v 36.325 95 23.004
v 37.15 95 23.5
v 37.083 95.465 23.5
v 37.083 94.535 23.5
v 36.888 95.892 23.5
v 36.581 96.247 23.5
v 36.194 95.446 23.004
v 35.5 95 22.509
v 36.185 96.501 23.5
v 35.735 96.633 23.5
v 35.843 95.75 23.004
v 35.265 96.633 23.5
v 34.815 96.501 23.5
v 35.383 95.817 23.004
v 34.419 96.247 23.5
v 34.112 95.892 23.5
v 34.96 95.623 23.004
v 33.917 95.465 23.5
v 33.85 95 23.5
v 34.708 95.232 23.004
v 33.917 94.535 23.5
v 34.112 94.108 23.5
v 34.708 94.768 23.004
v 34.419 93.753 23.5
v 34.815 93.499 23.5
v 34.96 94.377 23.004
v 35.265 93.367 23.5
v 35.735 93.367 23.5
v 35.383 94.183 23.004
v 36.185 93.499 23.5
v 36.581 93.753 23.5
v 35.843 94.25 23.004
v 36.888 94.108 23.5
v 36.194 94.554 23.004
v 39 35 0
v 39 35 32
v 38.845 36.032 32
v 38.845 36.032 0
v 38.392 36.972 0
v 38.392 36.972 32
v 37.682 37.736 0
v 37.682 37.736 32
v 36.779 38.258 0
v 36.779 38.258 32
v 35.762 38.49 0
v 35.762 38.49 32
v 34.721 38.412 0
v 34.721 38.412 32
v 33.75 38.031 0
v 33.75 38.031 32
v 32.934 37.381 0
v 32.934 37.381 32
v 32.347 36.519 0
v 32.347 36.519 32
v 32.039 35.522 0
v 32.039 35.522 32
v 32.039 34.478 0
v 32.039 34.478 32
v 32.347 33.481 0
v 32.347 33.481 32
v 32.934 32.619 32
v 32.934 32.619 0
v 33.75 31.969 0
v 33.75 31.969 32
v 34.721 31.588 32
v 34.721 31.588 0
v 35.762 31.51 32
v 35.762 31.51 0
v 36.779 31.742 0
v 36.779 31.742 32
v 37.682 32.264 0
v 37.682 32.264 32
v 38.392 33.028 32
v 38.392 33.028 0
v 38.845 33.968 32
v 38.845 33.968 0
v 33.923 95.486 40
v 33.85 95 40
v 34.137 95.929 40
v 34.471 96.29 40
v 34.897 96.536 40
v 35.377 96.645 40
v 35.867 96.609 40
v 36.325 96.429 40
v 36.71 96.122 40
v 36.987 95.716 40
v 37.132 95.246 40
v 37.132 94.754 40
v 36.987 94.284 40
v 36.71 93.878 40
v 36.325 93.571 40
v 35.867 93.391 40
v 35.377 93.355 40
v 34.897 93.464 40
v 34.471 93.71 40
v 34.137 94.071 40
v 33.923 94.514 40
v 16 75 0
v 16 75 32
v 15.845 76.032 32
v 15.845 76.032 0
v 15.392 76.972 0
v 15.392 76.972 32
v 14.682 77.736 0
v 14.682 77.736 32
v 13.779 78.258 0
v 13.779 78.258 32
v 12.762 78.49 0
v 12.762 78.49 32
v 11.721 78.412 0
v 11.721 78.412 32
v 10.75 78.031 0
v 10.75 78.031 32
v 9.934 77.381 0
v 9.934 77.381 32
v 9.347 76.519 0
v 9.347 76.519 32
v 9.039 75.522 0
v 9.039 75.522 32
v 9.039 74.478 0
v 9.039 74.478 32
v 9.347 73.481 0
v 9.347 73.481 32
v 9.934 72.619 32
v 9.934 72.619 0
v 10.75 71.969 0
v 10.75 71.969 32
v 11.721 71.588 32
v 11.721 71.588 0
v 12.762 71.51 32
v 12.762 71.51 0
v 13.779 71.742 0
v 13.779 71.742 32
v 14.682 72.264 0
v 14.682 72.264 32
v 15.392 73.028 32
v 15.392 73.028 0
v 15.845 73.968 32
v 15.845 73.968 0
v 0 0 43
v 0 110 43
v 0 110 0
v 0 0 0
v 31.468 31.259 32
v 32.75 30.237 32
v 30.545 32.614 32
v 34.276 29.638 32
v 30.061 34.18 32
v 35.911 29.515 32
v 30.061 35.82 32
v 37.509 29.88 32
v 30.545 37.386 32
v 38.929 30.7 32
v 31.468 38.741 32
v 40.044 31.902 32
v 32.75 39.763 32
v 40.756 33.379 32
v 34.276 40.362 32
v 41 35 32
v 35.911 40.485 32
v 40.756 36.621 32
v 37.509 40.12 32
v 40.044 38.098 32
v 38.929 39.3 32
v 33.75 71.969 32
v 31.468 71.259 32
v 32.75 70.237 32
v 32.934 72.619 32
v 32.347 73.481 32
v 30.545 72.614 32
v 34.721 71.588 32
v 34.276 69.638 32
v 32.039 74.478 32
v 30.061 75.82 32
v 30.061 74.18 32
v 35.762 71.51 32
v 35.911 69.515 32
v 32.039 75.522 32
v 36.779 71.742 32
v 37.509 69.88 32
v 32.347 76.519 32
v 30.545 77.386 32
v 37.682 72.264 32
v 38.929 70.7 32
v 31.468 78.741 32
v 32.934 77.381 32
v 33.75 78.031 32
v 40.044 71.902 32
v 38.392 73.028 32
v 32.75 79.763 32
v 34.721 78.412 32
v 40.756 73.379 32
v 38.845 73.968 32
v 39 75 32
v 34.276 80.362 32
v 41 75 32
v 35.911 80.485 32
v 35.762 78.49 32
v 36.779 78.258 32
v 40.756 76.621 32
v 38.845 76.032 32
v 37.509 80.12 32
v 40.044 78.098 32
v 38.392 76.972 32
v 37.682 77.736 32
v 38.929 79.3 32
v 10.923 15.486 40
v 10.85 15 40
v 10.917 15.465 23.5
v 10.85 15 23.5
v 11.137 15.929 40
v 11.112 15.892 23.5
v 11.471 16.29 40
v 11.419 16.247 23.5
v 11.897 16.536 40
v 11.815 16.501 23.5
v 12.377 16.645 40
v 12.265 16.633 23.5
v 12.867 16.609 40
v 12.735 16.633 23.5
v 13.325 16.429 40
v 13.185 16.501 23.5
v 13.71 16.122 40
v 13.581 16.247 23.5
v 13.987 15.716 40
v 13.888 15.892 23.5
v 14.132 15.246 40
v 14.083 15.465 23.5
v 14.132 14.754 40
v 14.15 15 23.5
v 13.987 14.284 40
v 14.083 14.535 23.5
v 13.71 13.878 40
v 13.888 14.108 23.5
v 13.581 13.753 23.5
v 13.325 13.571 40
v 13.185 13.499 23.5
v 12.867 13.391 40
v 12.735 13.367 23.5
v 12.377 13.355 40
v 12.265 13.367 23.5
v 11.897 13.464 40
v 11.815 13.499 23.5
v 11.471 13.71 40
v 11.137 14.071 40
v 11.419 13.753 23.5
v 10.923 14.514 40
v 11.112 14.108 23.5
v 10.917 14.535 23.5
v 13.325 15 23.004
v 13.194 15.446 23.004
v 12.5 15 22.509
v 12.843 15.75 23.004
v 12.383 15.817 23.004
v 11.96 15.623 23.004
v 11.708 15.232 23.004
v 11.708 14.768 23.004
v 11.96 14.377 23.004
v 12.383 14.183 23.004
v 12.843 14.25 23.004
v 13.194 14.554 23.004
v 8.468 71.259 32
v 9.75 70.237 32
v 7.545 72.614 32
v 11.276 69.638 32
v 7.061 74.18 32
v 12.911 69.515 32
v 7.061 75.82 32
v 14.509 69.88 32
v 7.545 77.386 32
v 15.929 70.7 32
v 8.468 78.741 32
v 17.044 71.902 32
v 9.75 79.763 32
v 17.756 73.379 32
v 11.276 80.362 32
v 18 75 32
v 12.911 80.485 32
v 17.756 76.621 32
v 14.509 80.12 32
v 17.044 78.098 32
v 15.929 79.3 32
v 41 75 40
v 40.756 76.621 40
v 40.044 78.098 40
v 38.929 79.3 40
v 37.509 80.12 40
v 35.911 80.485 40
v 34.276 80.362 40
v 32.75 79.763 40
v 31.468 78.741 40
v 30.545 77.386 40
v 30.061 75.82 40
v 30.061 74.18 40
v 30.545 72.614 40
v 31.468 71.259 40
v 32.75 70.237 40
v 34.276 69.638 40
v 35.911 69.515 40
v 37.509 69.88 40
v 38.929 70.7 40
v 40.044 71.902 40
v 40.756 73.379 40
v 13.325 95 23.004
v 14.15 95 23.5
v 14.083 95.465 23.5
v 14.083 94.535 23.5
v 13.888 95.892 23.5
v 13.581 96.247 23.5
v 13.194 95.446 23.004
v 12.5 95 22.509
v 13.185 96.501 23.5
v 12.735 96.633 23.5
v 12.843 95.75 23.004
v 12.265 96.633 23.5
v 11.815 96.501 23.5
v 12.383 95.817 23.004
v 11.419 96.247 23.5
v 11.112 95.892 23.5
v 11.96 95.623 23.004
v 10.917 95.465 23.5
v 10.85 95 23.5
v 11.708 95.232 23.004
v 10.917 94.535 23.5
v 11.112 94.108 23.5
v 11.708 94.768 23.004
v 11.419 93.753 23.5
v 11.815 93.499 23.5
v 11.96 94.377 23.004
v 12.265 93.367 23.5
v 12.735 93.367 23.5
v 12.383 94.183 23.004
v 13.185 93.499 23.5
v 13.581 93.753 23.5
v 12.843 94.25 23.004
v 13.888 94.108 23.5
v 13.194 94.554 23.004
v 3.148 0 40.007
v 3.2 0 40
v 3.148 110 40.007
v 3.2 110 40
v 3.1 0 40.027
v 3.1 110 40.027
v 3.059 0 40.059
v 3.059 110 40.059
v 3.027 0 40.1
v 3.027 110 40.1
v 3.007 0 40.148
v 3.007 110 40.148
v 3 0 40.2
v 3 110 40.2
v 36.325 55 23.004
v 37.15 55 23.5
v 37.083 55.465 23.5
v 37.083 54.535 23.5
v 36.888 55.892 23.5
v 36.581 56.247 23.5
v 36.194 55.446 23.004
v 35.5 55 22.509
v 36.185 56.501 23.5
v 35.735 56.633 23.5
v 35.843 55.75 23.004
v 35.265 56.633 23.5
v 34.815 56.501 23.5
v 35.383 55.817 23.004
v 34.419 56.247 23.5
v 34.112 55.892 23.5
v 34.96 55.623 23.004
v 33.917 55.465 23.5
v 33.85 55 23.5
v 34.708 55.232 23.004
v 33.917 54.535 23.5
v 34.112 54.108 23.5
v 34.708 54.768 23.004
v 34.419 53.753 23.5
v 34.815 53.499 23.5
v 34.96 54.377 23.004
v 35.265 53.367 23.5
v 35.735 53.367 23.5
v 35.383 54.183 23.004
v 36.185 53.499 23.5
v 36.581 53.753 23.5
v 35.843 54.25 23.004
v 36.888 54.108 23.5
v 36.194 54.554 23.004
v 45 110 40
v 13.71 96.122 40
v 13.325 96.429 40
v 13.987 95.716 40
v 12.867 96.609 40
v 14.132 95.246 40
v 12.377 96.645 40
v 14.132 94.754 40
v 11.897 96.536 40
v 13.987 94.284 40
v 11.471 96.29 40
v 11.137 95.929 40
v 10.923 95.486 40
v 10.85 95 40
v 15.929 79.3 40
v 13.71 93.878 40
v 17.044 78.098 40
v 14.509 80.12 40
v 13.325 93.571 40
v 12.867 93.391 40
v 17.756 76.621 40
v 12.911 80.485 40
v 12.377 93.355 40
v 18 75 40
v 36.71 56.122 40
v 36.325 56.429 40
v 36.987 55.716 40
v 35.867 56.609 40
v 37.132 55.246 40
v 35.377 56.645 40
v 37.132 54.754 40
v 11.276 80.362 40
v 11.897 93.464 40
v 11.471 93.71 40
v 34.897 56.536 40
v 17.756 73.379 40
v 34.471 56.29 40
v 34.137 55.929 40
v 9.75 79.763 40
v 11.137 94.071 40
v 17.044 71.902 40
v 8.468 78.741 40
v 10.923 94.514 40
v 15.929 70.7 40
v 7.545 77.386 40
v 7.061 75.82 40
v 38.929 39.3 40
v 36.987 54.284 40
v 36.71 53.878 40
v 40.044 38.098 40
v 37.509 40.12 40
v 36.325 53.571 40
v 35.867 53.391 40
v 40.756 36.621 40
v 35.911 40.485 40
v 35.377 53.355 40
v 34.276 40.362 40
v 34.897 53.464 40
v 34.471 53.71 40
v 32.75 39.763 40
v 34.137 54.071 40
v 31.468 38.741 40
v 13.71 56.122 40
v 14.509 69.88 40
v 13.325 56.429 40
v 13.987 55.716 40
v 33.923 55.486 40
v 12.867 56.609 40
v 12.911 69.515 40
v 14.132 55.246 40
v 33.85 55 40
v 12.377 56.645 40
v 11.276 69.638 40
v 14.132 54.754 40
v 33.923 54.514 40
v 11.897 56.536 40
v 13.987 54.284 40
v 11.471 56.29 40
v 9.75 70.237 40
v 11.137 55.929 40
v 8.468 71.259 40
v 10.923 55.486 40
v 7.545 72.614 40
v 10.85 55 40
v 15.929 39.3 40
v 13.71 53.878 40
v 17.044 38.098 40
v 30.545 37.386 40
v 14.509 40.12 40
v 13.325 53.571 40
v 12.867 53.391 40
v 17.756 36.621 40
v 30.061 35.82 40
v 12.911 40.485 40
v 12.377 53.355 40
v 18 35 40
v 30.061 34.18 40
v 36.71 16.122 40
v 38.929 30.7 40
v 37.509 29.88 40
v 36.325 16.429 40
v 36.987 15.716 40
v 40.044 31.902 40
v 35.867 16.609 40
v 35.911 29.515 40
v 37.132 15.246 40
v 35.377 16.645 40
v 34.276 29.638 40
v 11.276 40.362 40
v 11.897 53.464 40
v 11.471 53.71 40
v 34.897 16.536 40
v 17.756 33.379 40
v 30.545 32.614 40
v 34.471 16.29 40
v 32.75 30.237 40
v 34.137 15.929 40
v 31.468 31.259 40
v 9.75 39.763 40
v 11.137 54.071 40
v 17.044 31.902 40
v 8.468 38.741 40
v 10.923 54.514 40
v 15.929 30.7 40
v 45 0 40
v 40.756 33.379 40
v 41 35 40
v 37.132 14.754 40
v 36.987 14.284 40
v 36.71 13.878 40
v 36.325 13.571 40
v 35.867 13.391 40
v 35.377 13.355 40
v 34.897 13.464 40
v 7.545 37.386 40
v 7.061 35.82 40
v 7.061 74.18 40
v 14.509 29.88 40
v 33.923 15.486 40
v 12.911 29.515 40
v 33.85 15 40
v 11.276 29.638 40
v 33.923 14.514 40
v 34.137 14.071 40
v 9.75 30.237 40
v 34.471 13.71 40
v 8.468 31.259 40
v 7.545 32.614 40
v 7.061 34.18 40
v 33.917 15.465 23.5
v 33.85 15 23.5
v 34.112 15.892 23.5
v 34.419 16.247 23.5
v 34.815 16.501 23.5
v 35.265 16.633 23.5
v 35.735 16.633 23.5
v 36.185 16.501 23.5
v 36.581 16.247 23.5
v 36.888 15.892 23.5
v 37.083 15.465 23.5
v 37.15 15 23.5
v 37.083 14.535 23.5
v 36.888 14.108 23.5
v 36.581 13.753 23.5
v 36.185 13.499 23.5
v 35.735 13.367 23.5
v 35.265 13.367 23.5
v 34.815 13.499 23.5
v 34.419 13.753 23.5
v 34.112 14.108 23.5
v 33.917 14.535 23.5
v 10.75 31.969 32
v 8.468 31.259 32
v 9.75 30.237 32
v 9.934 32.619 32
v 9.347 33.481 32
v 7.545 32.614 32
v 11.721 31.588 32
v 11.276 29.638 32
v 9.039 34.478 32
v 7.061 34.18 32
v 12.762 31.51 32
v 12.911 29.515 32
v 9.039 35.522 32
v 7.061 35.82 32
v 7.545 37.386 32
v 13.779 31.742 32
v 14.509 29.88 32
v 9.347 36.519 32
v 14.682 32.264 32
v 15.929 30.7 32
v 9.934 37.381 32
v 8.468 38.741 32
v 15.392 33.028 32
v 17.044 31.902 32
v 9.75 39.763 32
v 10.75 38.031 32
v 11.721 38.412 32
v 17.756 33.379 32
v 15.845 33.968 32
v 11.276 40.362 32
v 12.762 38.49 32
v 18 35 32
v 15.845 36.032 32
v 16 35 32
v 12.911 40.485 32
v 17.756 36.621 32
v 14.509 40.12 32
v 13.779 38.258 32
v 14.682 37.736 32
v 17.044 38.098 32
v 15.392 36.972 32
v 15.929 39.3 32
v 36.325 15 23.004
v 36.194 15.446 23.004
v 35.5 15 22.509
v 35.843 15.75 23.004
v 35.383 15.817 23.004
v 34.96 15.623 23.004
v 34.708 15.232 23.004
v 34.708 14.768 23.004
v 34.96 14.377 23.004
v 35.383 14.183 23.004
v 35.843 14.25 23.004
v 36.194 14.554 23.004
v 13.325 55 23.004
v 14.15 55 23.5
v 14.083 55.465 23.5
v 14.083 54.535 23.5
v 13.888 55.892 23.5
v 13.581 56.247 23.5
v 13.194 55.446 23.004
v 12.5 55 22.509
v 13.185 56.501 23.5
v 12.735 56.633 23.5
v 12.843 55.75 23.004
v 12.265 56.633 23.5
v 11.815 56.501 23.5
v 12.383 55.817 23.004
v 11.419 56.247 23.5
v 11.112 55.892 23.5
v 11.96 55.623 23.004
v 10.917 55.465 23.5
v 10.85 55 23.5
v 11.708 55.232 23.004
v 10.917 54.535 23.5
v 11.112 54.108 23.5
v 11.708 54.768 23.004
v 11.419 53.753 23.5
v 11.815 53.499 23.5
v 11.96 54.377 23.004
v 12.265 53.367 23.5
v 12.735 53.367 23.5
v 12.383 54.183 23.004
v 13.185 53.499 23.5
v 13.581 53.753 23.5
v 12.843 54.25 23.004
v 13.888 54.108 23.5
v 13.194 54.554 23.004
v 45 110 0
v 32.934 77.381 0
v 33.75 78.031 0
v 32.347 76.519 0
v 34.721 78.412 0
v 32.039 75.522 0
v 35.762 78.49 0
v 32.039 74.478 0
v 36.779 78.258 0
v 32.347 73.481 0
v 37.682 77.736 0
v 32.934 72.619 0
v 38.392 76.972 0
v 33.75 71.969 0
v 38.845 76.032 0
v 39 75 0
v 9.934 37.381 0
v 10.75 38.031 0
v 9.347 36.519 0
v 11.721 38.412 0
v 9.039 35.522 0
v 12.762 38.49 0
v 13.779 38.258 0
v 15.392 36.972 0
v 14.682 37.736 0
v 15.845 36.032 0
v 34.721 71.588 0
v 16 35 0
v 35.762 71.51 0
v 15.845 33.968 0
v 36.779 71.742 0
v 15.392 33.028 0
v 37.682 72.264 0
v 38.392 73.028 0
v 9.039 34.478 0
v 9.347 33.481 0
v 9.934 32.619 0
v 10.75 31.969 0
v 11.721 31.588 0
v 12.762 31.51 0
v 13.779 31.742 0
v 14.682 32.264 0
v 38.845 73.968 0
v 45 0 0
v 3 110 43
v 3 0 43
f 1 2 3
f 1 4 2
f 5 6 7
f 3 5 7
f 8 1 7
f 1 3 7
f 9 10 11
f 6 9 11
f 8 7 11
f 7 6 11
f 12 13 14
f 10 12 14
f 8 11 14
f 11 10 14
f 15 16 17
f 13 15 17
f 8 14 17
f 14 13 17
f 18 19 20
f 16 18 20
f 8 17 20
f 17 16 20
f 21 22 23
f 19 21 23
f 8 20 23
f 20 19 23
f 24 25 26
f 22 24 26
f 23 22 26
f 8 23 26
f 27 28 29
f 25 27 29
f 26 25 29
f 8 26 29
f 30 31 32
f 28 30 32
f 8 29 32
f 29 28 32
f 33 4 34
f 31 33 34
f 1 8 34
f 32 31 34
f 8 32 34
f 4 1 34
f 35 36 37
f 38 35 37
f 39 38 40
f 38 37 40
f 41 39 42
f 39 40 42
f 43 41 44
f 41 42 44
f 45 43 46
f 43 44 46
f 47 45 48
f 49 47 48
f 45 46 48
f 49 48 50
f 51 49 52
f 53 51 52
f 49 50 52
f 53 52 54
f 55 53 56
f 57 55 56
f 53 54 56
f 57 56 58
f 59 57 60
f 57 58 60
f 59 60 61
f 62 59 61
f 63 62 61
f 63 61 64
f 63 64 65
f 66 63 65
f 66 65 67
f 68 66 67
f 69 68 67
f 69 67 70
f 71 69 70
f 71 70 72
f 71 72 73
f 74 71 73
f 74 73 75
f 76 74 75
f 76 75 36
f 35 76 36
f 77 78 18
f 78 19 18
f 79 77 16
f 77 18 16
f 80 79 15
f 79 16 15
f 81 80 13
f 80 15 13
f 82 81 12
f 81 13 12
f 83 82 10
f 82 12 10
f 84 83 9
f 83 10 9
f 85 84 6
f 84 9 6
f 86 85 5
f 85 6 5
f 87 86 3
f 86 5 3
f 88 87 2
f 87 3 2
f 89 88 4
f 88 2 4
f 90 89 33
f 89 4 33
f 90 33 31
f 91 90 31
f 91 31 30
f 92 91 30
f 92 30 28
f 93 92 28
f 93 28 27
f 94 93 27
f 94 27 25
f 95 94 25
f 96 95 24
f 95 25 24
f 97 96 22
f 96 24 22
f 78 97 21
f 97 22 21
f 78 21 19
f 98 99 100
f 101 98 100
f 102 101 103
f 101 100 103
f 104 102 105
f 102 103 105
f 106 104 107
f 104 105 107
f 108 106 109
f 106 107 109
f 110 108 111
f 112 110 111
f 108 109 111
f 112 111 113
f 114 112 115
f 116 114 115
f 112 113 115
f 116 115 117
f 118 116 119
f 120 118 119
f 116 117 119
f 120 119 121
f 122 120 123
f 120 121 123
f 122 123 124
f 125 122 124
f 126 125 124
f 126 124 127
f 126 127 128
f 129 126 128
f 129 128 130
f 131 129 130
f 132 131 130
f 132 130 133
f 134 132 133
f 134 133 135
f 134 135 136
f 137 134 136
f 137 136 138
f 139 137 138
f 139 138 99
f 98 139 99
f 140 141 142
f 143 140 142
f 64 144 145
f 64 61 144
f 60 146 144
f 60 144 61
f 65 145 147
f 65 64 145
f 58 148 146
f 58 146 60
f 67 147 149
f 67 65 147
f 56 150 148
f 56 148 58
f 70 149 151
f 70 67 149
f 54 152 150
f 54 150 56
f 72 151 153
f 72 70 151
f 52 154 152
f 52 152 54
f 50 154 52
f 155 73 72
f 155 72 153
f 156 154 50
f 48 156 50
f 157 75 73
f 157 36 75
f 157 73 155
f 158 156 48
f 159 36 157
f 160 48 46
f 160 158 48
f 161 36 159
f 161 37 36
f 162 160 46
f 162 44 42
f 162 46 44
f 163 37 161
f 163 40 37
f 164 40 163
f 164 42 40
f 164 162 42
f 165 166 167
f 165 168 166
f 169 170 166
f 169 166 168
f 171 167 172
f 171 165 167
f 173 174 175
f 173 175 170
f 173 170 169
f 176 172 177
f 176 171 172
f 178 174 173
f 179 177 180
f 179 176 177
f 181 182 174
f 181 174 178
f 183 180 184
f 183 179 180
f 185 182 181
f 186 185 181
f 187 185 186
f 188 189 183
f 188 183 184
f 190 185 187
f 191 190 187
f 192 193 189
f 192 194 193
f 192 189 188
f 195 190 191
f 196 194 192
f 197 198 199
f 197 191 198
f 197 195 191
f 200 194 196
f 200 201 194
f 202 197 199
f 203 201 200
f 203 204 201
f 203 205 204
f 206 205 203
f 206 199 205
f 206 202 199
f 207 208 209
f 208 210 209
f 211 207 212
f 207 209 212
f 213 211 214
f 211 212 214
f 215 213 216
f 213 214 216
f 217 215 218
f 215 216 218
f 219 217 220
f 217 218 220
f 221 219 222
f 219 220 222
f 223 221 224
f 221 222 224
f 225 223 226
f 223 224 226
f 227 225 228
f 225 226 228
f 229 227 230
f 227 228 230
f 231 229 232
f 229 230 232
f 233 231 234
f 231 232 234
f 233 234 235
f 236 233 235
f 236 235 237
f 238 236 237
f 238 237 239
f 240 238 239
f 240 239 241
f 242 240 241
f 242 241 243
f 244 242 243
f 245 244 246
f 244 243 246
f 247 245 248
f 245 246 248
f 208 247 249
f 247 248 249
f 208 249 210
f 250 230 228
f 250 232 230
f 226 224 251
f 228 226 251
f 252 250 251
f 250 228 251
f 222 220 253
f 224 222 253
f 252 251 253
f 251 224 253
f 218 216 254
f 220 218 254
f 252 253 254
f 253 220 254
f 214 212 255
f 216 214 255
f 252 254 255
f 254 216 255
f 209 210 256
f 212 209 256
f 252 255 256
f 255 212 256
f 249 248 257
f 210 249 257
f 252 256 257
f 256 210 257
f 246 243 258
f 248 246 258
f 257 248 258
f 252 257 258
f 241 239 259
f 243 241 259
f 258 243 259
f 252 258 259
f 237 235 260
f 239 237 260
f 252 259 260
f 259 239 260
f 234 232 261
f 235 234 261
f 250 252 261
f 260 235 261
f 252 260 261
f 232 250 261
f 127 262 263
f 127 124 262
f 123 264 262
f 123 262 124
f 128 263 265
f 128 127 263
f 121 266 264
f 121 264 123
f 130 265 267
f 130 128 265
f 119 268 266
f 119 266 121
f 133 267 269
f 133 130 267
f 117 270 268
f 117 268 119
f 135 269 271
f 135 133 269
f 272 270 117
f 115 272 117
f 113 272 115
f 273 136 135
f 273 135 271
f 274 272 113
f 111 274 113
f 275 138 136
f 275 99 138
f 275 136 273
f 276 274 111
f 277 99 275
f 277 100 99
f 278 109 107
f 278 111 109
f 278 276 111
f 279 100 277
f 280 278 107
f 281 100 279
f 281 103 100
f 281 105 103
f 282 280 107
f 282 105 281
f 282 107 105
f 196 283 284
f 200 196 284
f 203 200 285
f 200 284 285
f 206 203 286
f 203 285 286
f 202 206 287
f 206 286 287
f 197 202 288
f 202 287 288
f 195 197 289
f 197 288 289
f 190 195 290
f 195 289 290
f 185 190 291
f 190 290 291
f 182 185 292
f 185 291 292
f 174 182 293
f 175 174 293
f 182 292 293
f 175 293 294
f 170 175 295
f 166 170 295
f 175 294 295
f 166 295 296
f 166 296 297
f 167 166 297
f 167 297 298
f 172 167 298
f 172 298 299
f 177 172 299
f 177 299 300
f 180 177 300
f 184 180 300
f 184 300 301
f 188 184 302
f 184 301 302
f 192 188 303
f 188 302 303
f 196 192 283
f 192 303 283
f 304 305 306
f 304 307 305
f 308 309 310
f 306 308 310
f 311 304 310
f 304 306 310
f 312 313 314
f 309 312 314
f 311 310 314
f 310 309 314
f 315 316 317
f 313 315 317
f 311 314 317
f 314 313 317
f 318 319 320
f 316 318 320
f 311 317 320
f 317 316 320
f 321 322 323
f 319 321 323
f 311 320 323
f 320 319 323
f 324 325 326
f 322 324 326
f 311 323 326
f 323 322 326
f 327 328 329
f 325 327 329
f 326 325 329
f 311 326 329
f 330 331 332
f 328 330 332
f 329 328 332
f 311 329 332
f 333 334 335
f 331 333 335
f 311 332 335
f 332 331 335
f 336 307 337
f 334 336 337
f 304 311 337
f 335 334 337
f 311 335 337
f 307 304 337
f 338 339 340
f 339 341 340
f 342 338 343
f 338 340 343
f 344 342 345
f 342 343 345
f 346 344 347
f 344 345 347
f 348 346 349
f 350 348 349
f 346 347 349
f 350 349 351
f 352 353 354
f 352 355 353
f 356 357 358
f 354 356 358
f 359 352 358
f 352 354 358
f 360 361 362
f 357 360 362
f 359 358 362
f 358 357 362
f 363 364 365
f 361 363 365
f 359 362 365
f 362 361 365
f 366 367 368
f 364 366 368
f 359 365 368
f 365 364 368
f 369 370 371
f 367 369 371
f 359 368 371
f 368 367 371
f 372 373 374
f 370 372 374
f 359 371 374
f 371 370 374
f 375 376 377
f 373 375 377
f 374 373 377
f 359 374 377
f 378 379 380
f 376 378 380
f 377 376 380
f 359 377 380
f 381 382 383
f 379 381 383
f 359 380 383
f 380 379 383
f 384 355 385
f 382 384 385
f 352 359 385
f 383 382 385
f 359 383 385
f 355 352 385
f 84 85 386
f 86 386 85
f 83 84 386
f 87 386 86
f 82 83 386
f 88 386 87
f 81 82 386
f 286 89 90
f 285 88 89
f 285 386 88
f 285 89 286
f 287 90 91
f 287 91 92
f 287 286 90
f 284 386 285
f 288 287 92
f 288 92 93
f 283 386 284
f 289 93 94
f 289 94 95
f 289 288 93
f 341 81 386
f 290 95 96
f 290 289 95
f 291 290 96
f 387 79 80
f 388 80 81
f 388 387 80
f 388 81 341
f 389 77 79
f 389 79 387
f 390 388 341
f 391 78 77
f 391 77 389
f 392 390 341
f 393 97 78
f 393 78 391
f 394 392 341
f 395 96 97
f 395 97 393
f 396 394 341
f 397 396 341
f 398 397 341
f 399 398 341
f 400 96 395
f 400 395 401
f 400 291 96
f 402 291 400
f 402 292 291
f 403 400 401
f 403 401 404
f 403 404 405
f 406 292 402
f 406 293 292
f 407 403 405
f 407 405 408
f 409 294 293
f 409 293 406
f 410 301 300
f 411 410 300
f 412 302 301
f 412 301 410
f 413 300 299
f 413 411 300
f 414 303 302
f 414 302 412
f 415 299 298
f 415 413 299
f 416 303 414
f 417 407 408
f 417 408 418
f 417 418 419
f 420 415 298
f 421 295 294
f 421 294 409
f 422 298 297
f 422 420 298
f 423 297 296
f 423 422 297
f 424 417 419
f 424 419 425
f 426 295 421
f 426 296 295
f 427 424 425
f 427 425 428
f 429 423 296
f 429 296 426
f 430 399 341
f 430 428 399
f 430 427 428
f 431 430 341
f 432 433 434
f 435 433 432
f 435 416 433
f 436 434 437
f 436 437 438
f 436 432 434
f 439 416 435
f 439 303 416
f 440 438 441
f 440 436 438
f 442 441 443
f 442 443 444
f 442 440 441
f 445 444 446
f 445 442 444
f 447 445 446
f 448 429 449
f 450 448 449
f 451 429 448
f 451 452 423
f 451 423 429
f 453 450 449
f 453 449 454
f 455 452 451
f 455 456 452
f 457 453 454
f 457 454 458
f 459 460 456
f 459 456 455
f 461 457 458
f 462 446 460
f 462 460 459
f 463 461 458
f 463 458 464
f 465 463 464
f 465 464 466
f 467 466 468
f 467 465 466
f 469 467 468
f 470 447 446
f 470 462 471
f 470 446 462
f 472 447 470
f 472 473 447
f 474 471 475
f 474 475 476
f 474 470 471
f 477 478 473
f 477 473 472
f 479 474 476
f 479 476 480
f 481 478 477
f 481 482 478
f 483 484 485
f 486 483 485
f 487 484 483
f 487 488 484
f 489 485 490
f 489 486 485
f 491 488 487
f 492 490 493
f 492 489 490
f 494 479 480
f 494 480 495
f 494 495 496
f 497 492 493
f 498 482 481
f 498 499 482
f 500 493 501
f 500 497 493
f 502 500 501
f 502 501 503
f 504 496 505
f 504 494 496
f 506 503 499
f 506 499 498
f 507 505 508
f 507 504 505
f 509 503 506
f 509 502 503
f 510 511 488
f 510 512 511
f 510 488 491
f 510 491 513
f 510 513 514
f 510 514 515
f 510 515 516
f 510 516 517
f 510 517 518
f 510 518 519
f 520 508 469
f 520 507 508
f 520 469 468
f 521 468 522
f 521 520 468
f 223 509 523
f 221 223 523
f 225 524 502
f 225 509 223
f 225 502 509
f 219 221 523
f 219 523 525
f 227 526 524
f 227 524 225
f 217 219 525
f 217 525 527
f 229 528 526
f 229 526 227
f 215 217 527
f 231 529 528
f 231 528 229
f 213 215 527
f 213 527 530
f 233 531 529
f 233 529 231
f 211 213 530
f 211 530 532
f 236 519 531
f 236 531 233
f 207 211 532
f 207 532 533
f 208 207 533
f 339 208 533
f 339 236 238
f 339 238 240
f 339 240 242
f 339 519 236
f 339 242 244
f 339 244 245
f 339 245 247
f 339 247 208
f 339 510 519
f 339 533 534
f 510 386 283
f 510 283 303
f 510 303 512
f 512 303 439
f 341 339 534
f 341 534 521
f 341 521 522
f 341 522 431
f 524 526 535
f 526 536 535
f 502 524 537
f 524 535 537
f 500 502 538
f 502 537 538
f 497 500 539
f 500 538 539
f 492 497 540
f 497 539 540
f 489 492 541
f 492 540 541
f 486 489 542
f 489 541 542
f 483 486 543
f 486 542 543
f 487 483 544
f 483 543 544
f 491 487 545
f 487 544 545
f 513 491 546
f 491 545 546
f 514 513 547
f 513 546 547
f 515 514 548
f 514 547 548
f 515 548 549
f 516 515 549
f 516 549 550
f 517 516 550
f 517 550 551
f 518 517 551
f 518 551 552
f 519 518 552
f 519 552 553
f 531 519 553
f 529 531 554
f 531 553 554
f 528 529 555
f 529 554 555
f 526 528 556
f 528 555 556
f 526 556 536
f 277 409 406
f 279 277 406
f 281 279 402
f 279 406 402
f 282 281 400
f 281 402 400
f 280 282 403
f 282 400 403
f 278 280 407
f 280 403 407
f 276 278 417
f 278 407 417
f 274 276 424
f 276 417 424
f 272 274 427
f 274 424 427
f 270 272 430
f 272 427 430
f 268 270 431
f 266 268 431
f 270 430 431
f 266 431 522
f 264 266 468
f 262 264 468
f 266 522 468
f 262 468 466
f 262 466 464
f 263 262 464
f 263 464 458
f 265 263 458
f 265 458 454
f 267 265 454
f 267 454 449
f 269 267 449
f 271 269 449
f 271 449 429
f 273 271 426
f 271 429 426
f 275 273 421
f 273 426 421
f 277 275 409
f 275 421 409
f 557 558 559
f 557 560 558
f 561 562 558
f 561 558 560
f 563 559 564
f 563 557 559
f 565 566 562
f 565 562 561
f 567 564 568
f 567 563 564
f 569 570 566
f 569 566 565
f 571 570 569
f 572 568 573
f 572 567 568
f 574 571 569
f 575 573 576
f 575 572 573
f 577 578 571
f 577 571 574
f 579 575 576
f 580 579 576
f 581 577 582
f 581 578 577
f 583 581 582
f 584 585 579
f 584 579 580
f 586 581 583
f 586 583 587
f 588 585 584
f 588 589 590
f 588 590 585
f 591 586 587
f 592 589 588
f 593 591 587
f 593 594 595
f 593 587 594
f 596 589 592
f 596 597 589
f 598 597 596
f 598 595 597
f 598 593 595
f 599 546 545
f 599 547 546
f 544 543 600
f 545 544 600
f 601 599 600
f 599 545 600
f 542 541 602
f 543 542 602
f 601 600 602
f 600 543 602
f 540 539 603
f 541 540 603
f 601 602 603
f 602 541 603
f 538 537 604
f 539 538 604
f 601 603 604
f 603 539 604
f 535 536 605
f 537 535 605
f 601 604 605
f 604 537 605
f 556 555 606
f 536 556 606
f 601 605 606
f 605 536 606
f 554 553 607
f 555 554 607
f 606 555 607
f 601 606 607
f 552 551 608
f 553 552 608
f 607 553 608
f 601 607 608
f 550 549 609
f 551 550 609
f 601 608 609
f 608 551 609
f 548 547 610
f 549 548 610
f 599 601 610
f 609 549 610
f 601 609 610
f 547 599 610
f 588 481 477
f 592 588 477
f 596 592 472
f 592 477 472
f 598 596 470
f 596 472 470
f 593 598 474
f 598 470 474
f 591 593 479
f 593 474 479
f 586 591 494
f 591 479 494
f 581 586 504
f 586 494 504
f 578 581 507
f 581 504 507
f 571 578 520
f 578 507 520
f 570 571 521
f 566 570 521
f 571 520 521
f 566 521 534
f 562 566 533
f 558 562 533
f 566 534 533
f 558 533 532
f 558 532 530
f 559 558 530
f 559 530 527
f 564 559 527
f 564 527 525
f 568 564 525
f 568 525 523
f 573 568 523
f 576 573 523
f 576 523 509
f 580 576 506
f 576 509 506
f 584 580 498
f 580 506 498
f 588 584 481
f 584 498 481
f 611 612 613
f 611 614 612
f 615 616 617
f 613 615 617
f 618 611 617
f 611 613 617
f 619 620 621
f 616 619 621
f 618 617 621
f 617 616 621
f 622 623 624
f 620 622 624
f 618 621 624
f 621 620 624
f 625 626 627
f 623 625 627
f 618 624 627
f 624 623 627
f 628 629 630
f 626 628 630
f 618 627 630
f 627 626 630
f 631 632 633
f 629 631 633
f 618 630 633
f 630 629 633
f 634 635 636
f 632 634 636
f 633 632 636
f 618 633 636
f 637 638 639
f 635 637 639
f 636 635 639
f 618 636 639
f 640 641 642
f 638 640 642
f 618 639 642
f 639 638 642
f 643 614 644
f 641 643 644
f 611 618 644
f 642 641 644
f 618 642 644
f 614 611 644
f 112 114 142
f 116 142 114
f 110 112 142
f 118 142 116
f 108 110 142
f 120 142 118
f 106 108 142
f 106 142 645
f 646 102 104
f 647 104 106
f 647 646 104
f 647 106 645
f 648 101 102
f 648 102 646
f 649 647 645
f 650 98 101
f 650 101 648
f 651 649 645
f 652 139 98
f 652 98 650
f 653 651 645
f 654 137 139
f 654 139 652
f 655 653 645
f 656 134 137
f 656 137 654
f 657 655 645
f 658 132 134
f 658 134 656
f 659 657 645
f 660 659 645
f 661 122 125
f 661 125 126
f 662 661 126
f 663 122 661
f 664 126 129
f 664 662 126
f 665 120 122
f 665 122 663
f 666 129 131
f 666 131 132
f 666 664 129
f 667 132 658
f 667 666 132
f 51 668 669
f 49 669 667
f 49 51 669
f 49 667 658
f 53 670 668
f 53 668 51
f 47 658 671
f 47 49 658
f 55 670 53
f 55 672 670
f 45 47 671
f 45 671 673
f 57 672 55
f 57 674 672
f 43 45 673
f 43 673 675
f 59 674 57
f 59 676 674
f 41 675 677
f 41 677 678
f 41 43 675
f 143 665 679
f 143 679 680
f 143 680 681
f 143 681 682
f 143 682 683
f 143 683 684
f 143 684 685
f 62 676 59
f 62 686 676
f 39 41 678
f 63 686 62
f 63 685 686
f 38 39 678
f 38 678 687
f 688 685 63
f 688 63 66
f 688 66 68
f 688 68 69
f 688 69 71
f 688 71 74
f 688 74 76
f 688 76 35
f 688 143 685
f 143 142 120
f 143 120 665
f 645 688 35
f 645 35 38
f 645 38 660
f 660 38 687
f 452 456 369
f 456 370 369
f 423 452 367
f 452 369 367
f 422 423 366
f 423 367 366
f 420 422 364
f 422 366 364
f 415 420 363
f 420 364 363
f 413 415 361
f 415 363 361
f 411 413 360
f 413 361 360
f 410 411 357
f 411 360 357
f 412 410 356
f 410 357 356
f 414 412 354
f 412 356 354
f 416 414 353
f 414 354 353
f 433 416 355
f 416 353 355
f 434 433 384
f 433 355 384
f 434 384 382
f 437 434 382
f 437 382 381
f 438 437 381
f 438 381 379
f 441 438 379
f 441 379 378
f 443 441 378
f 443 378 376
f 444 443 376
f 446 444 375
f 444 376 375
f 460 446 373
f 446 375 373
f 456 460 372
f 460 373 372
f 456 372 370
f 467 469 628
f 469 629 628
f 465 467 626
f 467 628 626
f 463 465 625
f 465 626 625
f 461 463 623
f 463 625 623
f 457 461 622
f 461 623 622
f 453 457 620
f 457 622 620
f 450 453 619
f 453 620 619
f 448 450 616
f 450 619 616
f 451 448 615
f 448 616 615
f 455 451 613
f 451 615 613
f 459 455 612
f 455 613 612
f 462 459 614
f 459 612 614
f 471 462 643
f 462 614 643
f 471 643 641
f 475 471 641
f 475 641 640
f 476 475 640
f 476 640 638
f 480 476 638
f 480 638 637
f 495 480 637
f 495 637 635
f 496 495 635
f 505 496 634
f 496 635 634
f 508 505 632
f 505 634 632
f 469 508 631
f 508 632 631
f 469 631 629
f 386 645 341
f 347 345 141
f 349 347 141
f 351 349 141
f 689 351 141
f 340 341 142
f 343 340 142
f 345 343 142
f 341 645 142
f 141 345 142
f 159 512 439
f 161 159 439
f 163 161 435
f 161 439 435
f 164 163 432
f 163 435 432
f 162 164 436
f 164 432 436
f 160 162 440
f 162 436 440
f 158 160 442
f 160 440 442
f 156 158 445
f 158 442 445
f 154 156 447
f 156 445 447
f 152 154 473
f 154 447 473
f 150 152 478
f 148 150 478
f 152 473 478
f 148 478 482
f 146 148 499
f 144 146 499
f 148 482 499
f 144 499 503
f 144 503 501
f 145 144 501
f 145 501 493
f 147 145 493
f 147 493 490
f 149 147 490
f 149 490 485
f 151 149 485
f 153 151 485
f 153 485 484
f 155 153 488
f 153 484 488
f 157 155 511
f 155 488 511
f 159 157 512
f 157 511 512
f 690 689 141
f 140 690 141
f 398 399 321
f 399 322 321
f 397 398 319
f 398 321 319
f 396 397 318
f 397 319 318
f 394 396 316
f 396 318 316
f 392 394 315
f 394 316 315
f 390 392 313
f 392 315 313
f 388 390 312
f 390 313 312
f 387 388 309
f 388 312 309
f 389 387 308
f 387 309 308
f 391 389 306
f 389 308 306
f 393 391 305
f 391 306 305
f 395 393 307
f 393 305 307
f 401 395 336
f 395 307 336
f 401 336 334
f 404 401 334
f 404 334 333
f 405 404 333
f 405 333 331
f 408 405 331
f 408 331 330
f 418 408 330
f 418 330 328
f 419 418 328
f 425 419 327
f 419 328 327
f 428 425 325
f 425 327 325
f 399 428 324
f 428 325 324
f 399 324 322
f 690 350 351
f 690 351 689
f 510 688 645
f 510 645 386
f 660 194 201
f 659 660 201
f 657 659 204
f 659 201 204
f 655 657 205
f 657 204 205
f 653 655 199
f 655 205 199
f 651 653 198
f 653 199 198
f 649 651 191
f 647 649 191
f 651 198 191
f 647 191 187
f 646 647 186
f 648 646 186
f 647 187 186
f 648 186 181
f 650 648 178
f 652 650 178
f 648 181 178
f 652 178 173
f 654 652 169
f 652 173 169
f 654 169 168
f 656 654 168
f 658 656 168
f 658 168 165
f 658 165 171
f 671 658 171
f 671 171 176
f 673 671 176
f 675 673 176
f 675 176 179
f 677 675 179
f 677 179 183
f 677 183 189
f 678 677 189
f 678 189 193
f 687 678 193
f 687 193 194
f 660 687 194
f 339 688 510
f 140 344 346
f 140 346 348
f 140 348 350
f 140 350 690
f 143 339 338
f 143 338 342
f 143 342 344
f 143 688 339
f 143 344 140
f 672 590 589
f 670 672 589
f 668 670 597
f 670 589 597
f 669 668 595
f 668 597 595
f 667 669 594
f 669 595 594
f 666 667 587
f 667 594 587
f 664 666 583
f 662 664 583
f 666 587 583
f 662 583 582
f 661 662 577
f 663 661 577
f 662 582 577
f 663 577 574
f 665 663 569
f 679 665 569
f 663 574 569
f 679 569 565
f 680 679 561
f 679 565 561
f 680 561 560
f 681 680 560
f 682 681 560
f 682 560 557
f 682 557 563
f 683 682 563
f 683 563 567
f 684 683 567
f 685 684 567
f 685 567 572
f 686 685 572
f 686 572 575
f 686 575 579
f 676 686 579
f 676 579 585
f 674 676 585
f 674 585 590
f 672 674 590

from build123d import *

# Parameters (mm, degrees)
EXTRUDE_1_DEPTH        = 110
FILLET_1_R             = 0.2
SKETCH_2_R             = 5.5
CUT_EXTRUDE_1_DEPTH    = 8
SKETCH_3_R             = 3.5
CUT_EXTRUDE_2_DEPTH    = 124.081273962
HOLE_WIZARD_M4_1_D     = 3.3
HOLE_WIZARD_M4_1_DEPTH = 16.5
HOLE_WIZARD_M4_1_TIP   = 0.991420021


with BuildPart() as part:
    # 스케치1 → 보스-돌출1 (new body)
    with BuildSketch(Plane(origin=(0, 0, 0), x_dir=(1, 0, 0), z_dir=(0, 1, 0))):
        Polygon((0, -43), (0, 0), (45, 0), (45, -40), (3, -40), (3, -43), align=None)
    extrude(amount=EXTRUDE_1_DEPTH)

    # 필렛1
    fillet_1_edges = [part.edges().sort_by_distance(p)[0] for p in [
        (3, 55, 40),
    ]]
    fillet(fillet_1_edges, radius=FILLET_1_R)

    # 스케치2 → 컷-돌출1 (cut)
    with BuildSketch(Plane.XY.offset(40)):
        with Locations((12.5, 75)):
            Circle(SKETCH_2_R)
        with Locations((35.5, 75)):
            Circle(SKETCH_2_R)
        with Locations((12.5, 35)):
            Circle(SKETCH_2_R)
        with Locations((35.5, 35)):
            Circle(SKETCH_2_R)
    extrude(amount=-CUT_EXTRUDE_1_DEPTH, mode=Mode.SUBTRACT)

    # 스케치3 → 컷-돌출2 (cut, through all)
    with BuildSketch(Plane.XY.offset(32)):
        with Locations((12.5, 75)):
            Circle(SKETCH_3_R)
        with Locations((35.5, 75)):
            Circle(SKETCH_3_R)
        with Locations((35.5, 35)):
            Circle(SKETCH_3_R)
        with Locations((12.5, 35)):
            Circle(SKETCH_3_R)
    extrude(amount=-CUT_EXTRUDE_2_DEPTH, mode=Mode.SUBTRACT)

    # M4 나사 구멍1
    with Locations(Plane.XY.offset(40)):
        with Locations((12.5, 95), (12.5, 15), (12.5, 55), (35.5, 55), (35.5, 95), (35.5, 15)):
            Hole(HOLE_WIZARD_M4_1_D / 2, depth=HOLE_WIZARD_M4_1_DEPTH)
            with Locations((0, 0, -(HOLE_WIZARD_M4_1_DEPTH + HOLE_WIZARD_M4_1_TIP / 2))):  # 118° drill point
                Cone(0, HOLE_WIZARD_M4_1_D / 2, HOLE_WIZARD_M4_1_TIP, mode=Mode.SUBTRACT)


solid = part.part
